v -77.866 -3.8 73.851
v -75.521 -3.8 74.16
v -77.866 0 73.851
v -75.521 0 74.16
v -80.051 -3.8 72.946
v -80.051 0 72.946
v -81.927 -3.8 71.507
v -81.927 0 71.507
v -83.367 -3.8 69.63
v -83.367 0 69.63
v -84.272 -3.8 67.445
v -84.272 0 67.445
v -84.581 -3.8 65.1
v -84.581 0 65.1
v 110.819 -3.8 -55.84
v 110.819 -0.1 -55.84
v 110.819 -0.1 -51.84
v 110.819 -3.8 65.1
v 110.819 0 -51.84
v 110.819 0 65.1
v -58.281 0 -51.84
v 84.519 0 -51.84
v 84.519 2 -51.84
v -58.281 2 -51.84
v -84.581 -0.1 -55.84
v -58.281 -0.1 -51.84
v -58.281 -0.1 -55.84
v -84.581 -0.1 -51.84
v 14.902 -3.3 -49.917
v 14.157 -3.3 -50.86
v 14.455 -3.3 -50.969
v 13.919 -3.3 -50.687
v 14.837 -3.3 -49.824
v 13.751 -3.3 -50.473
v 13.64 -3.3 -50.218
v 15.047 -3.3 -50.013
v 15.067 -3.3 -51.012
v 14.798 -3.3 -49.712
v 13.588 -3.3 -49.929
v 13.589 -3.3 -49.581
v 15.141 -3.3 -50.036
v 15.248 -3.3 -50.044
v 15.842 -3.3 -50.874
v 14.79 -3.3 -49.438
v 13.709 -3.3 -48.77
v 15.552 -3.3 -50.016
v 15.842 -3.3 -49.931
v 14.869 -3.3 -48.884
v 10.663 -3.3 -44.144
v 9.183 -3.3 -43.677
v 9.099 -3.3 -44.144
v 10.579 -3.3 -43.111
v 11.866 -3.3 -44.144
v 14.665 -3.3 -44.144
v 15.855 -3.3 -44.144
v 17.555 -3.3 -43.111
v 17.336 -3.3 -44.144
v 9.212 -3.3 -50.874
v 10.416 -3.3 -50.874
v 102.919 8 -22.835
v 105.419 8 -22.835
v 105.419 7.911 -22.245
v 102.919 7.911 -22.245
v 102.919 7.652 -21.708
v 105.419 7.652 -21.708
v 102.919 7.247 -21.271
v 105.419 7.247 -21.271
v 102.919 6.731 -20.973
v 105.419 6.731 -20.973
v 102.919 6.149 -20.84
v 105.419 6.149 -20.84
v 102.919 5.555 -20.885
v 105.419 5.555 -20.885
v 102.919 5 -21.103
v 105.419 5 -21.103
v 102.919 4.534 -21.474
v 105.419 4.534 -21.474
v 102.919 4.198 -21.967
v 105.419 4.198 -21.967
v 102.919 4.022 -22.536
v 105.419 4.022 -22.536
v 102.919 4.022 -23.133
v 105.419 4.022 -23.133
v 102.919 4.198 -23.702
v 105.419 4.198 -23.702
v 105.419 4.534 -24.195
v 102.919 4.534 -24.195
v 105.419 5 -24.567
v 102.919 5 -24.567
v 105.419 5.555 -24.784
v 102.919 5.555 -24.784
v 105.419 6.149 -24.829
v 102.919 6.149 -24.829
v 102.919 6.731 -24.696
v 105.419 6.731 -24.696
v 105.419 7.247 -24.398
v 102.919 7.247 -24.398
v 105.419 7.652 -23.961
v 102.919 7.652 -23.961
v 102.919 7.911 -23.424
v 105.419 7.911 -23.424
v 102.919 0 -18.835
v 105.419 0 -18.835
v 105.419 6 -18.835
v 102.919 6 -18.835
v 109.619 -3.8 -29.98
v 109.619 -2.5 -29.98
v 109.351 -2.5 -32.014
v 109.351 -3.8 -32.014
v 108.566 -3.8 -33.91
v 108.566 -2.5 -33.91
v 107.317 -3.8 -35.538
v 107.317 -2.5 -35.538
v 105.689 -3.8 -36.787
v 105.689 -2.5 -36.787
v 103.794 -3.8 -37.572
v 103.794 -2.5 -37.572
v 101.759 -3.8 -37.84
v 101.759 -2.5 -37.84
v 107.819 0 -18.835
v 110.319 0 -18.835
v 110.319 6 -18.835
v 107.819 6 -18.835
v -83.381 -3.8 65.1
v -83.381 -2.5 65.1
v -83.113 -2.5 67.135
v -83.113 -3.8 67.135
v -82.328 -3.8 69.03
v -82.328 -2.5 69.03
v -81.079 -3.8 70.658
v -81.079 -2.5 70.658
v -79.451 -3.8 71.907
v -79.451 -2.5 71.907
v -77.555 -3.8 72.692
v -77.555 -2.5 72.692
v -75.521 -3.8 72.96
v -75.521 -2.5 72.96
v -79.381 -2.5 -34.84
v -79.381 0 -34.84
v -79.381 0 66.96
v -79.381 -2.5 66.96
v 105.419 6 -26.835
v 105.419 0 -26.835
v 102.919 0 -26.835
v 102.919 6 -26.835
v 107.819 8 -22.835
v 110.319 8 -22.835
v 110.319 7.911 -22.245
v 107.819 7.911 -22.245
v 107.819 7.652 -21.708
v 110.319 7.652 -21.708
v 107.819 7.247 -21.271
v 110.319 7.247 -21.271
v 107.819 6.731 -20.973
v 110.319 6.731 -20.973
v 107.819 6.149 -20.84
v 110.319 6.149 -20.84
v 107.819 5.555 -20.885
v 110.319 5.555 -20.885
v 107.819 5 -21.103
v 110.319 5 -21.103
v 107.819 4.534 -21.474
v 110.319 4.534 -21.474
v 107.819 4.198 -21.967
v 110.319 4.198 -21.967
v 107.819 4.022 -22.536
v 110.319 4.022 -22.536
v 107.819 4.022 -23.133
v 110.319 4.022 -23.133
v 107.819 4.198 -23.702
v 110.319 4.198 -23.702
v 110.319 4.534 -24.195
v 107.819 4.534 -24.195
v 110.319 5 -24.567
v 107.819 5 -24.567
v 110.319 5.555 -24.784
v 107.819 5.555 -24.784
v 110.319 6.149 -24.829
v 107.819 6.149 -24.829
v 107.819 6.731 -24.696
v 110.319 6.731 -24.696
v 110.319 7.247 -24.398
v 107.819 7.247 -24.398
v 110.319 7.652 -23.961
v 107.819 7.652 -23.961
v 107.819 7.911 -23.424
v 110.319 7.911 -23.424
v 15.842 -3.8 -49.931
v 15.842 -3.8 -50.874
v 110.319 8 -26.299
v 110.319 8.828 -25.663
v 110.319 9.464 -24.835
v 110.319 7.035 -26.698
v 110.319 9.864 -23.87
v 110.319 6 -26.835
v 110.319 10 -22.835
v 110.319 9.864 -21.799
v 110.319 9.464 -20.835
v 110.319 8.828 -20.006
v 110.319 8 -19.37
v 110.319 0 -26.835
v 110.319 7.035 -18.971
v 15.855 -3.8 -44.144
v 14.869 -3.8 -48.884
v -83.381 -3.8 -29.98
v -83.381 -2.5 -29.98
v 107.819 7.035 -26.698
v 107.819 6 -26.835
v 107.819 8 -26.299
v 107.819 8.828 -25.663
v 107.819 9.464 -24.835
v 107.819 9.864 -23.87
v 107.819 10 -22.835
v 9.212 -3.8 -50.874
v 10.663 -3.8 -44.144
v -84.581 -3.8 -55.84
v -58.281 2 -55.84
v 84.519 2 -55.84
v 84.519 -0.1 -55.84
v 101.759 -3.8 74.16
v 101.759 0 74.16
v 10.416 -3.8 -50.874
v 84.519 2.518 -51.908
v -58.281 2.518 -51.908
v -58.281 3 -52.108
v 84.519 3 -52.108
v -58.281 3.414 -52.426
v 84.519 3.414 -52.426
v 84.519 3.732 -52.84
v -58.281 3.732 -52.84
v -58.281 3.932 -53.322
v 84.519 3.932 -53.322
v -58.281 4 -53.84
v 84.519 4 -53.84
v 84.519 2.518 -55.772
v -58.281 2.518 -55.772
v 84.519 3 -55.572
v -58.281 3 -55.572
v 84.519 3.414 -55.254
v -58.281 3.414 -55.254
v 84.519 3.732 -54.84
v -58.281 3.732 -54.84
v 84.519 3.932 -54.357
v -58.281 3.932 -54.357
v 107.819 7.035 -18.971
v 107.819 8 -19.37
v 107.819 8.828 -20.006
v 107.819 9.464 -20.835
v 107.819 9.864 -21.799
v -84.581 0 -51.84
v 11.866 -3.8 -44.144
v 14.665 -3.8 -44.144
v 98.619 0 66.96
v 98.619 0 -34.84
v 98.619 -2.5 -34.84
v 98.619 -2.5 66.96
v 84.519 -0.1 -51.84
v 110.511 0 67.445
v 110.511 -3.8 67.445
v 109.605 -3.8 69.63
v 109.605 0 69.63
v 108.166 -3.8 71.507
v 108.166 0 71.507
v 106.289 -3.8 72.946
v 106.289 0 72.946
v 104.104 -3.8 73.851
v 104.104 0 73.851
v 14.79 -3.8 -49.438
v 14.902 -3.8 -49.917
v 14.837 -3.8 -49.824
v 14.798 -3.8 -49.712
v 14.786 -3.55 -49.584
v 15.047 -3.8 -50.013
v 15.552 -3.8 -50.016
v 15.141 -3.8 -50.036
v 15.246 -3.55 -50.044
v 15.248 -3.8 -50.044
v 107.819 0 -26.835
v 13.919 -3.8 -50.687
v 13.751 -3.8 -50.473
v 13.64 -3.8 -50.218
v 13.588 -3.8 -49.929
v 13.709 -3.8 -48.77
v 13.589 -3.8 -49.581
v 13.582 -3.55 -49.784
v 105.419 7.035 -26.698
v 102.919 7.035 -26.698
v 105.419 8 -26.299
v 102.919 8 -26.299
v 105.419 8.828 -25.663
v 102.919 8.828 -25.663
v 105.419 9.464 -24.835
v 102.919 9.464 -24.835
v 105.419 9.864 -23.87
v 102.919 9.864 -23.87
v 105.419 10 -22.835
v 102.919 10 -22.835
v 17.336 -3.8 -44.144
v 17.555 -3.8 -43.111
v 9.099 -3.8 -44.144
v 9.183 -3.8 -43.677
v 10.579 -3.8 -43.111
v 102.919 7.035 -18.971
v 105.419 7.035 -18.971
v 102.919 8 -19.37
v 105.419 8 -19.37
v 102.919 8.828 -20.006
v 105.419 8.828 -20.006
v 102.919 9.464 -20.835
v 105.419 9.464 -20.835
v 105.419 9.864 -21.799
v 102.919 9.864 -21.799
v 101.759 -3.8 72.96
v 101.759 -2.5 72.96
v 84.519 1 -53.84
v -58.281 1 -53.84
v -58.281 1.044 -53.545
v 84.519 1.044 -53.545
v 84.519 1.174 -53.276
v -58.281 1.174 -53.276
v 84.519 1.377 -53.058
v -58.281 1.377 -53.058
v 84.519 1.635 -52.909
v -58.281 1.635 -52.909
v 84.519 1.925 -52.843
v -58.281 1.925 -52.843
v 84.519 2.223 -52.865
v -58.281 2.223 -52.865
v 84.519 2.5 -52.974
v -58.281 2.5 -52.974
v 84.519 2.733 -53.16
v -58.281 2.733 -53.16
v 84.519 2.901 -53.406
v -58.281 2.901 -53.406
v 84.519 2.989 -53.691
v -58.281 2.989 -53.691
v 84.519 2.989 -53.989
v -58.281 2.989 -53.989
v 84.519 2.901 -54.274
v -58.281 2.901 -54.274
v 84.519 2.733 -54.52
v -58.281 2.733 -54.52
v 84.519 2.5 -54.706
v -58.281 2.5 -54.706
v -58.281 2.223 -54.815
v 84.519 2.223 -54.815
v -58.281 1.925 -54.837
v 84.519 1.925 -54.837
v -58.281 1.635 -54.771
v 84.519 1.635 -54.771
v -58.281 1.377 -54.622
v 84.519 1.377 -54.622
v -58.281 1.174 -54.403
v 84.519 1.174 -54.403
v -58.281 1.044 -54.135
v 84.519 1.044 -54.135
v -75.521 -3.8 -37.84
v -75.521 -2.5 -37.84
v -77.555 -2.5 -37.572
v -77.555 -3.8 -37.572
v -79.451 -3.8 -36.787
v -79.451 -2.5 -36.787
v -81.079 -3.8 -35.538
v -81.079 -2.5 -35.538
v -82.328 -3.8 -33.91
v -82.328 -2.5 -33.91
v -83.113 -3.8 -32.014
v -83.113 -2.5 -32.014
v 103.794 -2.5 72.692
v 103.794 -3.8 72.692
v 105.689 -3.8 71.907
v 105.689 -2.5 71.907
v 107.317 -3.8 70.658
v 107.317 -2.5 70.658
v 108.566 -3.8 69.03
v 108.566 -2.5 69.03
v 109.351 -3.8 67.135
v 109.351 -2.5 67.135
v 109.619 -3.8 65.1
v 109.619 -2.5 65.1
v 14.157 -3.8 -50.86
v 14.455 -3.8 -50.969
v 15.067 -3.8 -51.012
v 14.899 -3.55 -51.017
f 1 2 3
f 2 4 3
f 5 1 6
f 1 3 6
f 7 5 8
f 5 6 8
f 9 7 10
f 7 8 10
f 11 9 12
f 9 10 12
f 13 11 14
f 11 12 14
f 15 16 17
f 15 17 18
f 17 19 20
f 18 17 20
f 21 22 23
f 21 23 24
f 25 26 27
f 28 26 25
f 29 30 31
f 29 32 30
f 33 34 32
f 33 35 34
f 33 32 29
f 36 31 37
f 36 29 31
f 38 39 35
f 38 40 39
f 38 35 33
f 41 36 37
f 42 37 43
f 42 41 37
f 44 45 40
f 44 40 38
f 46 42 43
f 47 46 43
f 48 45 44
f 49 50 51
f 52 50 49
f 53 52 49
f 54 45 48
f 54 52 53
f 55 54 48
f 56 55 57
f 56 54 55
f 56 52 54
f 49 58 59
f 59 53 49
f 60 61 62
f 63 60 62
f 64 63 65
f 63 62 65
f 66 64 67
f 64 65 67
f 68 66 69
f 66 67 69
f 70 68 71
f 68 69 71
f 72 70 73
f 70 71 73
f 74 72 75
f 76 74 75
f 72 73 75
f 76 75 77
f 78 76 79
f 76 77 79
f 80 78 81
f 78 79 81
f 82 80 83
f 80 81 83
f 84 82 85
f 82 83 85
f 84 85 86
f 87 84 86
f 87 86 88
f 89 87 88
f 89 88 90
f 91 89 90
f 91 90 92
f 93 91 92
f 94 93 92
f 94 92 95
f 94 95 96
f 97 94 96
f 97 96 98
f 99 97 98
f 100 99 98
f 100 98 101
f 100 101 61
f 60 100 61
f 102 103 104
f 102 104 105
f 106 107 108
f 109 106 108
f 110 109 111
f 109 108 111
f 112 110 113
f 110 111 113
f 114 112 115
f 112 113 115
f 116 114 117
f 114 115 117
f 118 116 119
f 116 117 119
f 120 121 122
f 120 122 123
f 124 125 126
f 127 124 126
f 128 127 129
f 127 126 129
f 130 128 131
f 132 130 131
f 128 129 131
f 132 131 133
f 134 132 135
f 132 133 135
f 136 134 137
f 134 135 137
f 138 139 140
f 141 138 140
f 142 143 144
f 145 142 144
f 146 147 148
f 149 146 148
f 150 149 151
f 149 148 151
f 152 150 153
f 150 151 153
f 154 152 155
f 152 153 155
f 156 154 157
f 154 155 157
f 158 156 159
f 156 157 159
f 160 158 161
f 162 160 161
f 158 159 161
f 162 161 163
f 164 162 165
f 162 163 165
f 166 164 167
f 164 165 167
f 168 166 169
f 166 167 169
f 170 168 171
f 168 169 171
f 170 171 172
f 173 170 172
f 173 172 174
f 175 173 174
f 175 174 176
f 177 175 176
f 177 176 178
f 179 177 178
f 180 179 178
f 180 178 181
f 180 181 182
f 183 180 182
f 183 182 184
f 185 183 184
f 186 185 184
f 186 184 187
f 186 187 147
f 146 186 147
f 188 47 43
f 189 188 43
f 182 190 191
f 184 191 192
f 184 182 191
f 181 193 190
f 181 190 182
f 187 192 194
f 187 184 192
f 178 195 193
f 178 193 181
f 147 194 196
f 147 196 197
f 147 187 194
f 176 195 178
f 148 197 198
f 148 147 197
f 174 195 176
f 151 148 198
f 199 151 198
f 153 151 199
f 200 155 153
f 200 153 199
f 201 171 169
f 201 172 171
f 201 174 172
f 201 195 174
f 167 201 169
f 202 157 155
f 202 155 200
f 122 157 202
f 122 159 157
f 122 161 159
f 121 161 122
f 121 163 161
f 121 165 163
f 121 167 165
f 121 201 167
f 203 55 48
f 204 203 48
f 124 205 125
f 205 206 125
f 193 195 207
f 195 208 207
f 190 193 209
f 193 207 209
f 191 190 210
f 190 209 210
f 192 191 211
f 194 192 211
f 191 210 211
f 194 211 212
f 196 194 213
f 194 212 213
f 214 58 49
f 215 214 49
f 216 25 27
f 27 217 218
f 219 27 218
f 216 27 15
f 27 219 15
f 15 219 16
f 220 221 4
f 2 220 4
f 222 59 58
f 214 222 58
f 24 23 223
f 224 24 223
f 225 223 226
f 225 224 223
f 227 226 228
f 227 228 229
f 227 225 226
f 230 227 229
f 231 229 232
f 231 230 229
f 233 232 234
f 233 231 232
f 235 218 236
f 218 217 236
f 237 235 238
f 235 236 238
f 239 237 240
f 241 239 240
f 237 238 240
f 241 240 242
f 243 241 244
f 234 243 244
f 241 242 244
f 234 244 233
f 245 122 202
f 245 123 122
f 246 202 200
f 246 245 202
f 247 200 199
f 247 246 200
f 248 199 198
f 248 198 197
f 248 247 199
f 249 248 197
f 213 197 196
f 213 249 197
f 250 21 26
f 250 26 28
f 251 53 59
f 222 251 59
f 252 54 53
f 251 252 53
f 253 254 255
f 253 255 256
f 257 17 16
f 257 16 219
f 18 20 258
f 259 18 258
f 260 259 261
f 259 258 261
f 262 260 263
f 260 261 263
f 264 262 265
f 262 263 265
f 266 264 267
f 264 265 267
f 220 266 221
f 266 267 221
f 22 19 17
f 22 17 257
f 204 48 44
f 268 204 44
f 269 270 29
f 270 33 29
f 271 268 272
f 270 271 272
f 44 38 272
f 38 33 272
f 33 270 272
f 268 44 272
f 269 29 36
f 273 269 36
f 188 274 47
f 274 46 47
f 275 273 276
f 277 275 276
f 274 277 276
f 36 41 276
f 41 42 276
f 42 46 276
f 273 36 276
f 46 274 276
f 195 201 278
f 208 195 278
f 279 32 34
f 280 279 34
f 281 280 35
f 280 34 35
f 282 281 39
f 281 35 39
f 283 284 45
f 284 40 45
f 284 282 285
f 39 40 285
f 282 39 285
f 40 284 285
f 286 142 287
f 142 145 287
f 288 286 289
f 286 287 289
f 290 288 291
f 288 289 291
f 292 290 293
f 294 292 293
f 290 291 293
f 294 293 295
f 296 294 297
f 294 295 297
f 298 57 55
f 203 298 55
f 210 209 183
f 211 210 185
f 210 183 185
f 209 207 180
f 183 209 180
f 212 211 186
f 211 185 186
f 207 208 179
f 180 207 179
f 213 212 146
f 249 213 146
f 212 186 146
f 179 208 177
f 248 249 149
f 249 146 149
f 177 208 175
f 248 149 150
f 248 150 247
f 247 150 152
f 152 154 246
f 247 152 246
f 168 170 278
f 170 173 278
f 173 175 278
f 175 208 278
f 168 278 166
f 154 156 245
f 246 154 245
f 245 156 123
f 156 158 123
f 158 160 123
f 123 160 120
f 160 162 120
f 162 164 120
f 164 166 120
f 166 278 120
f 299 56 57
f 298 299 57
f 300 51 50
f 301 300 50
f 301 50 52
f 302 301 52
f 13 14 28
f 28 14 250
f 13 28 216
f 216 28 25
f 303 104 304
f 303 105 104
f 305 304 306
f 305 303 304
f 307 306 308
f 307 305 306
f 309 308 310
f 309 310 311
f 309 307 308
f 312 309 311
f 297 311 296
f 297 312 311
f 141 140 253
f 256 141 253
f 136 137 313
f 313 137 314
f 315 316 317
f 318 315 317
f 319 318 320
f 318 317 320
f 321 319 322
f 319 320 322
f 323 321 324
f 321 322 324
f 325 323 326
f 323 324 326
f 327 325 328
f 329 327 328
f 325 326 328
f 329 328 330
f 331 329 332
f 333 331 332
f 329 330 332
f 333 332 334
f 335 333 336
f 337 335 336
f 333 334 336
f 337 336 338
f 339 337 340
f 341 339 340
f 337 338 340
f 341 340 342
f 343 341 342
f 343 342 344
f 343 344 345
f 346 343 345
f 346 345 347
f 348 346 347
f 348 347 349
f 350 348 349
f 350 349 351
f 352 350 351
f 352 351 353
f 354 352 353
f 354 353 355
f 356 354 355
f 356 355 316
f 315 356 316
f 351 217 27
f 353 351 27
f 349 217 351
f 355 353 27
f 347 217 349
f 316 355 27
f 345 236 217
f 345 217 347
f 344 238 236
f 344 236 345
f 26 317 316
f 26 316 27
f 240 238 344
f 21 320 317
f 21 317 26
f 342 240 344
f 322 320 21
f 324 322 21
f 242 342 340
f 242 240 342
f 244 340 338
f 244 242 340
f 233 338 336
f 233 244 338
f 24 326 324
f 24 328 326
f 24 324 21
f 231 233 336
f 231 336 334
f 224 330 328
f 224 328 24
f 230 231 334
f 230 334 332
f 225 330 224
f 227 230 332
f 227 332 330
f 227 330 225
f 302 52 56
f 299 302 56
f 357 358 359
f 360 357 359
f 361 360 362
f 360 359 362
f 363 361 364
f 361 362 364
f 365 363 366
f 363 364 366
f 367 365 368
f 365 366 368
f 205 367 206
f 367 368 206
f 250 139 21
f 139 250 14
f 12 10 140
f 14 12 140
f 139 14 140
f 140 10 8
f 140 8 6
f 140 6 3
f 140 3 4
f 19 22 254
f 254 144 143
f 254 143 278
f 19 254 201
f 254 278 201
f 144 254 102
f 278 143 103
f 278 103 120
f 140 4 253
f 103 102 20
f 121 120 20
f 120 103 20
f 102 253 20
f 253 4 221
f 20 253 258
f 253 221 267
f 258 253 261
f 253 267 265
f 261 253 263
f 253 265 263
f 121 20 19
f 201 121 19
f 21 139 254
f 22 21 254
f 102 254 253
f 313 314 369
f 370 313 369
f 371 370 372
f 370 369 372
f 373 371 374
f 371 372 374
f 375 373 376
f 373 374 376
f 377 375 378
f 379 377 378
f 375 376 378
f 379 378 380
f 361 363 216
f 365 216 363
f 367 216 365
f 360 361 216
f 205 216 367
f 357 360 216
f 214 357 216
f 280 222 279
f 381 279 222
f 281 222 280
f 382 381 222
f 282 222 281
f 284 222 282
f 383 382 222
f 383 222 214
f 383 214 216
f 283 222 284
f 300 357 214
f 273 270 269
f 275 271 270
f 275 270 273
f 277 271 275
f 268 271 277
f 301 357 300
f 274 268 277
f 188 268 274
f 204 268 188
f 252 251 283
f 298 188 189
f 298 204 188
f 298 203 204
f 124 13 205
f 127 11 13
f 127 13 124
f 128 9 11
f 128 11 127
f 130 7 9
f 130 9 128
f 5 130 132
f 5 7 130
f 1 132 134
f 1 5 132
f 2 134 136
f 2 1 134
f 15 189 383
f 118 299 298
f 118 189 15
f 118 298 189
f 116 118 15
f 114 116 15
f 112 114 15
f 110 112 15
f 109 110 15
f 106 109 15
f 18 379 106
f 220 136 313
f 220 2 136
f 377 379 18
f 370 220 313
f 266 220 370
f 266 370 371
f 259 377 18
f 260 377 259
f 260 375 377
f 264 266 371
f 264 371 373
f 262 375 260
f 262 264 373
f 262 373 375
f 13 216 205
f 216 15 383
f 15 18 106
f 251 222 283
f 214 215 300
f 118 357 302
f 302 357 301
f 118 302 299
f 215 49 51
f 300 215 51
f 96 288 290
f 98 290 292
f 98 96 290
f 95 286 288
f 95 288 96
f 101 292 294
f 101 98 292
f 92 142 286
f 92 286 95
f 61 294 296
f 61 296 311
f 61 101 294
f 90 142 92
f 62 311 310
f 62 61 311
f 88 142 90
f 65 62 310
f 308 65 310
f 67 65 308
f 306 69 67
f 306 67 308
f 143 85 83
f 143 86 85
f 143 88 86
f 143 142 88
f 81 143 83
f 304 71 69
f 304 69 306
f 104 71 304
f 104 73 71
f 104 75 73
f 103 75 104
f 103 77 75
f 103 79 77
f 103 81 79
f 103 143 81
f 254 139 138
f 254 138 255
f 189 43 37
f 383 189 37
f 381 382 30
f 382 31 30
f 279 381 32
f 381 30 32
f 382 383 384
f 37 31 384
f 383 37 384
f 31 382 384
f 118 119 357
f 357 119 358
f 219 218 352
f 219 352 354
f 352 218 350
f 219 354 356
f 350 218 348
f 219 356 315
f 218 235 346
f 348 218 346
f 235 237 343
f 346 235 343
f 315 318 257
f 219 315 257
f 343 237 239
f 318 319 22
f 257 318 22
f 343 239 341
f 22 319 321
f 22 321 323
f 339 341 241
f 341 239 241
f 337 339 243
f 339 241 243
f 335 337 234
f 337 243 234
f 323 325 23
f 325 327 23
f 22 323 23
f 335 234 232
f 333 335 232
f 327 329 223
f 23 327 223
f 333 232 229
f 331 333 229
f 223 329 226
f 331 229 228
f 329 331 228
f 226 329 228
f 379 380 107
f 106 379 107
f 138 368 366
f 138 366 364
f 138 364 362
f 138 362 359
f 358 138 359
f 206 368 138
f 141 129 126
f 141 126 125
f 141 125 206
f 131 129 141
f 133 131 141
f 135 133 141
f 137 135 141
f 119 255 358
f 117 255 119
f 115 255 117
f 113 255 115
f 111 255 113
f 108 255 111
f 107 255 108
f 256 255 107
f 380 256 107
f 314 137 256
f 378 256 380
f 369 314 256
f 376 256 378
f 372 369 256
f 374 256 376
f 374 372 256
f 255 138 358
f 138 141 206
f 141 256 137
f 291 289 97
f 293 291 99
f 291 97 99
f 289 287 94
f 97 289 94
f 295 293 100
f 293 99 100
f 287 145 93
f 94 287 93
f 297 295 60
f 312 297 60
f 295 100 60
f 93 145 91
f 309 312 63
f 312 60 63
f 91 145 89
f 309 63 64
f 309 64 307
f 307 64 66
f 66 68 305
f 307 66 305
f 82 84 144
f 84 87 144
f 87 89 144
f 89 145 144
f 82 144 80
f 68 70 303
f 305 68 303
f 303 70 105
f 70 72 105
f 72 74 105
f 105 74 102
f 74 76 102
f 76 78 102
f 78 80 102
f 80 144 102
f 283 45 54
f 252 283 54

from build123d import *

# Parameters (mm, degrees)
F1_DEPTH  = 3.3
F0_W      = 178
F0_H      = 101.8
F2_DEPTH  = 2.5
F3_W      = 142.8
F3_H      = 4
F4_DEPTH  = 4
F5_R      = 1.99999
F7_D      = 2
F3_W_2    = 26.3
F8_DEPTH  = 0.1
F10_DEPTH = 0.5
F3_W_3    = 2.5
F3_H_2    = 8
F11_DEPTH = 10
F12_R     = 3.99999
F13_R     = 2
F14_DEPTH = 10


# Not quite as in the source:
# - a fillet or chamfer is up to 0.001 mm smaller than in the source, because OpenCascade refuses the exact size


with BuildPart() as f1:
    # F0 (on Front) → F1 (new body)
    with BuildSketch(Plane.XZ):
        with BuildLine():
            ThreePointArc((-75.5207621713, 74.1601898761), (-81.9271496089, 71.5065773137), (-84.5807621713, 65.1001898761))
            Line((-84.5807621713, 65.1001898761), (-84.5807621713, -35.3734344864))
            Line((-84.5807621713, -35.3734344864), (-84.5807621713, -55.8398101239))
            Line((-84.5807621713, -55.8398101239), (110.8192378287, -55.8398101239))
            Line((110.8192378287, -55.8398101239), (110.8192378287, -35.3734344864))
            Line((110.8192378287, -35.3734344864), (110.8192378287, 65.1001898761))
            ThreePointArc((110.8192378287, 65.1001898761), (108.1656252662, 71.5065773137), (101.7592378287, 74.1601898761))
            Line((101.7592378287, 74.1601898761), (-75.5207621713, 74.1601898761))
        make_face()
        with BuildLine():
            ThreePointArc((-83.3807621713, 65.1001898761), (-81.0786214714, 70.6580491763), (-75.5207621713, 72.9601898761))
            Line((-75.5207621713, 72.9601898761), (101.7592378287, 72.9601898761))
            ThreePointArc((101.7592378287, 72.9601898761), (107.3170971288, 70.6580491763), (109.6192378287, 65.1001898761))
            Line((109.6192378287, 65.1001898761), (109.6192378287, -29.9798101239))
            ThreePointArc((109.6192378287, -29.9798101239), (107.3170971288, -35.537669424), (101.7592378287, -37.8398101239))
            Line((101.7592378287, -37.8398101239), (-75.5207621713, -37.8398101239))
            ThreePointArc((-75.5207621713, -37.8398101239), (-81.0786214714, -35.537669424), (-83.3807621713, -29.9798101239))
            Line((-83.3807621713, -29.9798101239), (-83.3807621713, 65.1001898761))
        make_face(mode=Mode.SUBTRACT)
    extrude(amount=F1_DEPTH)

    # F0 (on Front) → F2 (join)
    with BuildSketch(Plane.XZ):
        with BuildLine():
            Line((101.7592378287, 72.9601898761), (-75.5207621713, 72.9601898761))
            ThreePointArc((-75.5207621713, 72.9601898761), (-81.0786214714, 70.6580491763), (-83.3807621713, 65.1001898761))
            Line((-83.3807621713, 65.1001898761), (-83.3807621713, -29.9798101239))
            ThreePointArc((-83.3807621713, -29.9798101239), (-81.0786214714, -35.537669424), (-75.5207621713, -37.8398101239))
            Line((-75.5207621713, -37.8398101239), (101.7592378287, -37.8398101239))
            ThreePointArc((101.7592378287, -37.8398101239), (107.3170971288, -35.537669424), (109.6192378287, -29.9798101239))
            Line((109.6192378287, -29.9798101239), (109.6192378287, 65.1001898761))
            ThreePointArc((109.6192378287, 65.1001898761), (107.3170971288, 70.6580491763), (101.7592378287, 72.9601898761))
        make_face()
        with Locations((9.6192378287, 16.0601898761)):
            Rectangle(F0_W, F0_H, mode=Mode.SUBTRACT)
    extrude(amount=F2_DEPTH)

    # F3 (on face) → F4 (join)
    with BuildSketch(Plane(origin=(0, 0, 0), x_dir=(-1, 0, 0), z_dir=(0, 1, 0))):
        with Locations((-13.1192378287, -53.8398101239)):
            Rectangle(F3_W, F3_H)
    extrude(amount=F4_DEPTH)

    # F5 (radius 2 in the source; OpenCascade refuses exactly that, so slightly less here)
    f5_edges = [f1.edges().sort_by_distance(p)[0] for p in [
        (13.119238, 4, -51.83981),
        (13.119238, 4, -55.83981),
    ]]
    fillet(f5_edges, radius=F5_R)

    # F7 (through all)
    with Locations(Plane.YZ.offset(84.5192378287)):
        with Locations((2, -53.8398101239)):
            Hole(F7_D / 2)

    # F3 (on face) → F8 (cut)
    with BuildSketch(Plane(origin=(0, 0, 0), x_dir=(-1, 0, 0), z_dir=(0, 1, 0))):
        with Locations((-97.6692378287, -53.8398101239)):
            Rectangle(F3_W_2, F3_H)
        with Locations((71.4307621713, -53.8398101239)):
            Rectangle(F3_W_2, F3_H)
    extrude(amount=-F8_DEPTH, mode=Mode.SUBTRACT)

    # F9 (on face) → F10 (join)
    with BuildSketch(Plane.XZ.offset(3.3)):
        with BuildLine():
            Line((101.7592378287, 74.1601898761), (-75.5207621713, 74.1601898761))
            ThreePointArc((-75.5207621713, 74.1601898761), (-81.9271496089, 71.5065773137), (-84.5807621713, 65.1001898761))
            Line((-84.5807621713, 65.1001898761), (-84.5807621713, -55.8398101239))
            Line((-84.5807621713, -55.8398101239), (110.8192378287, -55.8398101239))
            Line((110.8192378287, -55.8398101239), (110.8192378287, 65.1001898761))
            ThreePointArc((110.8192378287, 65.1001898761), (108.1656252662, 71.5065773137), (101.7592378287, 74.1601898761))
        make_face()
        with BuildLine():
            add(Edge.make_bspline(
                [(14.902347951, -49.9172276662), (15.0190761779, -50.0441554468), (15.2457329289, -50.0441554468)],
                knots=[0, 0, 0, 1, 1, 1], degree=2))
            add(Edge.make_bspline(
                [(15.2457329289, -50.0441554468), (15.5585192454, -50.0441554468), (15.8418401843, -49.9308270713)],
                knots=[0, 0, 0, 1, 1, 1], degree=2))
            Line((15.8418401843, -49.9308270713), (15.8418401843, -50.8737191558))
            add(Edge.make_bspline(
                [(15.8418401843, -50.8737191558), (15.3454618994, -51.016512909), (14.8989480998, -51.016512909)],
                knots=[0, 0, 0, 1, 1, 1], degree=2))
            add(Edge.make_bspline(
                [(14.8989480998, -51.016512909), (14.2552429267, -51.016512909), (13.9186576513, -50.6867273361)],
                knots=[0, 0, 0, 1, 1, 1], degree=2))
            add(Edge.make_bspline(
                [(13.9186576513, -50.6867273361), (13.582072376, -50.3569417633), (13.582072376, -49.7835001831)],
                knots=[0, 0, 0, 1, 1, 1], degree=2))
            add(Edge.make_bspline(
                [(13.582072376, -49.7835001831), (13.582072376, -49.3505857885), (13.7090001566, -48.7703445057)],
                knots=[0, 0, 0, 1, 1, 1], degree=2))
            Line((13.7090001566, -48.7703445057), (14.6654916462, -44.144280216))
            Line((14.6654916462, -44.144280216), (11.8662807702, -44.144280216))
            Line((11.8662807702, -44.144280216), (10.4156775633, -50.8737191558))
            Line((10.4156775633, -50.8737191558), (9.212130215, -50.8737191558))
            Line((9.212130215, -50.8737191558), (10.662733422, -44.144280216))
            Line((10.662733422, -44.144280216), (9.0988018395, -44.144280216))
            Line((9.0988018395, -44.144280216), (9.1826648374, -43.6773673088))
            Line((9.1826648374, -43.6773673088), (10.5788704241, -43.1107254311))
            Line((10.5788704241, -43.1107254311), (17.5553652225, -43.1107254311))
            Line((17.5553652225, -43.1107254311), (17.335508174, -44.144280216))
            Line((17.335508174, -44.144280216), (15.8554395894, -44.144280216))
            Line((15.8554395894, -44.144280216), (14.8694827221, -48.8836728813))
            add(Edge.make_bspline(
                [(14.8694827221, -48.8836728813), (14.7856197242, -49.2939216007), (14.7856197242, -49.5840422421)],
                knots=[0, 0, 0, 1, 1, 1], degree=2))
            add(Edge.make_bspline(
                [(14.7856197242, -49.5840422421), (14.7856197242, -49.7902998856), (14.902347951, -49.9172276662)],
                knots=[0, 0, 0, 1, 1, 1], degree=2))
        make_face(mode=Mode.SUBTRACT)
        with BuildLine():
            Line((-83.3807621713, -29.9798101239), (-83.3807621713, 65.1001898761))
            ThreePointArc((-83.3807621713, 65.1001898761), (-81.0786214714, 70.6580491763), (-75.5207621713, 72.9601898761))
            Line((-75.5207621713, 72.9601898761), (101.7592378287, 72.9601898761))
            ThreePointArc((101.7592378287, 72.9601898761), (107.3170971288, 70.6580491763), (109.6192378287, 65.1001898761))
            Line((109.6192378287, 65.1001898761), (109.6192378287, -29.9798101239))
            ThreePointArc((109.6192378287, -29.9798101239), (107.3170971288, -35.537669424), (101.7592378287, -37.8398101239))
            Line((101.7592378287, -37.8398101239), (-75.5207621713, -37.8398101239))
            ThreePointArc((-75.5207621713, -37.8398101239), (-81.0786214714, -35.537669424), (-83.3807621713, -29.9798101239))
        make_face(mode=Mode.SUBTRACT)
    extrude(amount=F10_DEPTH)

    # F3 (on face) → F11 (join)
    with BuildSketch(Plane(origin=(0, 0, 0), x_dir=(-1, 0, 0), z_dir=(0, 1, 0))):
        with Locations((-109.0692378287, -22.8345717341)):
            Rectangle(F3_W_3, F3_H_2)
        with Locations((-104.1692378287, -22.8345717341)):
            Rectangle(F3_W_3, F3_H_2)
    extrude(amount=F11_DEPTH)

    # F12 (radius 4 in the source; OpenCascade refuses exactly that, so slightly less here)
    f12_edges = [f1.edges().sort_by_distance(p)[0] for p in [
        (109.069238, 10, -18.834572),
        (109.069238, 10, -26.834572),
        (104.169238, 10, -18.834572),
        (104.169238, 10, -26.834572),
    ]]
    fillet(f12_edges, radius=F12_R)

    # F13 (on face) → F14 (cut)
    with BuildSketch(Plane.YZ.offset(110.3192378287)):
        with Locations((6, -22.8345717341)):
            Circle(F13_R)
    extrude(amount=-F14_DEPTH, mode=Mode.SUBTRACT)


solid = f1.part
